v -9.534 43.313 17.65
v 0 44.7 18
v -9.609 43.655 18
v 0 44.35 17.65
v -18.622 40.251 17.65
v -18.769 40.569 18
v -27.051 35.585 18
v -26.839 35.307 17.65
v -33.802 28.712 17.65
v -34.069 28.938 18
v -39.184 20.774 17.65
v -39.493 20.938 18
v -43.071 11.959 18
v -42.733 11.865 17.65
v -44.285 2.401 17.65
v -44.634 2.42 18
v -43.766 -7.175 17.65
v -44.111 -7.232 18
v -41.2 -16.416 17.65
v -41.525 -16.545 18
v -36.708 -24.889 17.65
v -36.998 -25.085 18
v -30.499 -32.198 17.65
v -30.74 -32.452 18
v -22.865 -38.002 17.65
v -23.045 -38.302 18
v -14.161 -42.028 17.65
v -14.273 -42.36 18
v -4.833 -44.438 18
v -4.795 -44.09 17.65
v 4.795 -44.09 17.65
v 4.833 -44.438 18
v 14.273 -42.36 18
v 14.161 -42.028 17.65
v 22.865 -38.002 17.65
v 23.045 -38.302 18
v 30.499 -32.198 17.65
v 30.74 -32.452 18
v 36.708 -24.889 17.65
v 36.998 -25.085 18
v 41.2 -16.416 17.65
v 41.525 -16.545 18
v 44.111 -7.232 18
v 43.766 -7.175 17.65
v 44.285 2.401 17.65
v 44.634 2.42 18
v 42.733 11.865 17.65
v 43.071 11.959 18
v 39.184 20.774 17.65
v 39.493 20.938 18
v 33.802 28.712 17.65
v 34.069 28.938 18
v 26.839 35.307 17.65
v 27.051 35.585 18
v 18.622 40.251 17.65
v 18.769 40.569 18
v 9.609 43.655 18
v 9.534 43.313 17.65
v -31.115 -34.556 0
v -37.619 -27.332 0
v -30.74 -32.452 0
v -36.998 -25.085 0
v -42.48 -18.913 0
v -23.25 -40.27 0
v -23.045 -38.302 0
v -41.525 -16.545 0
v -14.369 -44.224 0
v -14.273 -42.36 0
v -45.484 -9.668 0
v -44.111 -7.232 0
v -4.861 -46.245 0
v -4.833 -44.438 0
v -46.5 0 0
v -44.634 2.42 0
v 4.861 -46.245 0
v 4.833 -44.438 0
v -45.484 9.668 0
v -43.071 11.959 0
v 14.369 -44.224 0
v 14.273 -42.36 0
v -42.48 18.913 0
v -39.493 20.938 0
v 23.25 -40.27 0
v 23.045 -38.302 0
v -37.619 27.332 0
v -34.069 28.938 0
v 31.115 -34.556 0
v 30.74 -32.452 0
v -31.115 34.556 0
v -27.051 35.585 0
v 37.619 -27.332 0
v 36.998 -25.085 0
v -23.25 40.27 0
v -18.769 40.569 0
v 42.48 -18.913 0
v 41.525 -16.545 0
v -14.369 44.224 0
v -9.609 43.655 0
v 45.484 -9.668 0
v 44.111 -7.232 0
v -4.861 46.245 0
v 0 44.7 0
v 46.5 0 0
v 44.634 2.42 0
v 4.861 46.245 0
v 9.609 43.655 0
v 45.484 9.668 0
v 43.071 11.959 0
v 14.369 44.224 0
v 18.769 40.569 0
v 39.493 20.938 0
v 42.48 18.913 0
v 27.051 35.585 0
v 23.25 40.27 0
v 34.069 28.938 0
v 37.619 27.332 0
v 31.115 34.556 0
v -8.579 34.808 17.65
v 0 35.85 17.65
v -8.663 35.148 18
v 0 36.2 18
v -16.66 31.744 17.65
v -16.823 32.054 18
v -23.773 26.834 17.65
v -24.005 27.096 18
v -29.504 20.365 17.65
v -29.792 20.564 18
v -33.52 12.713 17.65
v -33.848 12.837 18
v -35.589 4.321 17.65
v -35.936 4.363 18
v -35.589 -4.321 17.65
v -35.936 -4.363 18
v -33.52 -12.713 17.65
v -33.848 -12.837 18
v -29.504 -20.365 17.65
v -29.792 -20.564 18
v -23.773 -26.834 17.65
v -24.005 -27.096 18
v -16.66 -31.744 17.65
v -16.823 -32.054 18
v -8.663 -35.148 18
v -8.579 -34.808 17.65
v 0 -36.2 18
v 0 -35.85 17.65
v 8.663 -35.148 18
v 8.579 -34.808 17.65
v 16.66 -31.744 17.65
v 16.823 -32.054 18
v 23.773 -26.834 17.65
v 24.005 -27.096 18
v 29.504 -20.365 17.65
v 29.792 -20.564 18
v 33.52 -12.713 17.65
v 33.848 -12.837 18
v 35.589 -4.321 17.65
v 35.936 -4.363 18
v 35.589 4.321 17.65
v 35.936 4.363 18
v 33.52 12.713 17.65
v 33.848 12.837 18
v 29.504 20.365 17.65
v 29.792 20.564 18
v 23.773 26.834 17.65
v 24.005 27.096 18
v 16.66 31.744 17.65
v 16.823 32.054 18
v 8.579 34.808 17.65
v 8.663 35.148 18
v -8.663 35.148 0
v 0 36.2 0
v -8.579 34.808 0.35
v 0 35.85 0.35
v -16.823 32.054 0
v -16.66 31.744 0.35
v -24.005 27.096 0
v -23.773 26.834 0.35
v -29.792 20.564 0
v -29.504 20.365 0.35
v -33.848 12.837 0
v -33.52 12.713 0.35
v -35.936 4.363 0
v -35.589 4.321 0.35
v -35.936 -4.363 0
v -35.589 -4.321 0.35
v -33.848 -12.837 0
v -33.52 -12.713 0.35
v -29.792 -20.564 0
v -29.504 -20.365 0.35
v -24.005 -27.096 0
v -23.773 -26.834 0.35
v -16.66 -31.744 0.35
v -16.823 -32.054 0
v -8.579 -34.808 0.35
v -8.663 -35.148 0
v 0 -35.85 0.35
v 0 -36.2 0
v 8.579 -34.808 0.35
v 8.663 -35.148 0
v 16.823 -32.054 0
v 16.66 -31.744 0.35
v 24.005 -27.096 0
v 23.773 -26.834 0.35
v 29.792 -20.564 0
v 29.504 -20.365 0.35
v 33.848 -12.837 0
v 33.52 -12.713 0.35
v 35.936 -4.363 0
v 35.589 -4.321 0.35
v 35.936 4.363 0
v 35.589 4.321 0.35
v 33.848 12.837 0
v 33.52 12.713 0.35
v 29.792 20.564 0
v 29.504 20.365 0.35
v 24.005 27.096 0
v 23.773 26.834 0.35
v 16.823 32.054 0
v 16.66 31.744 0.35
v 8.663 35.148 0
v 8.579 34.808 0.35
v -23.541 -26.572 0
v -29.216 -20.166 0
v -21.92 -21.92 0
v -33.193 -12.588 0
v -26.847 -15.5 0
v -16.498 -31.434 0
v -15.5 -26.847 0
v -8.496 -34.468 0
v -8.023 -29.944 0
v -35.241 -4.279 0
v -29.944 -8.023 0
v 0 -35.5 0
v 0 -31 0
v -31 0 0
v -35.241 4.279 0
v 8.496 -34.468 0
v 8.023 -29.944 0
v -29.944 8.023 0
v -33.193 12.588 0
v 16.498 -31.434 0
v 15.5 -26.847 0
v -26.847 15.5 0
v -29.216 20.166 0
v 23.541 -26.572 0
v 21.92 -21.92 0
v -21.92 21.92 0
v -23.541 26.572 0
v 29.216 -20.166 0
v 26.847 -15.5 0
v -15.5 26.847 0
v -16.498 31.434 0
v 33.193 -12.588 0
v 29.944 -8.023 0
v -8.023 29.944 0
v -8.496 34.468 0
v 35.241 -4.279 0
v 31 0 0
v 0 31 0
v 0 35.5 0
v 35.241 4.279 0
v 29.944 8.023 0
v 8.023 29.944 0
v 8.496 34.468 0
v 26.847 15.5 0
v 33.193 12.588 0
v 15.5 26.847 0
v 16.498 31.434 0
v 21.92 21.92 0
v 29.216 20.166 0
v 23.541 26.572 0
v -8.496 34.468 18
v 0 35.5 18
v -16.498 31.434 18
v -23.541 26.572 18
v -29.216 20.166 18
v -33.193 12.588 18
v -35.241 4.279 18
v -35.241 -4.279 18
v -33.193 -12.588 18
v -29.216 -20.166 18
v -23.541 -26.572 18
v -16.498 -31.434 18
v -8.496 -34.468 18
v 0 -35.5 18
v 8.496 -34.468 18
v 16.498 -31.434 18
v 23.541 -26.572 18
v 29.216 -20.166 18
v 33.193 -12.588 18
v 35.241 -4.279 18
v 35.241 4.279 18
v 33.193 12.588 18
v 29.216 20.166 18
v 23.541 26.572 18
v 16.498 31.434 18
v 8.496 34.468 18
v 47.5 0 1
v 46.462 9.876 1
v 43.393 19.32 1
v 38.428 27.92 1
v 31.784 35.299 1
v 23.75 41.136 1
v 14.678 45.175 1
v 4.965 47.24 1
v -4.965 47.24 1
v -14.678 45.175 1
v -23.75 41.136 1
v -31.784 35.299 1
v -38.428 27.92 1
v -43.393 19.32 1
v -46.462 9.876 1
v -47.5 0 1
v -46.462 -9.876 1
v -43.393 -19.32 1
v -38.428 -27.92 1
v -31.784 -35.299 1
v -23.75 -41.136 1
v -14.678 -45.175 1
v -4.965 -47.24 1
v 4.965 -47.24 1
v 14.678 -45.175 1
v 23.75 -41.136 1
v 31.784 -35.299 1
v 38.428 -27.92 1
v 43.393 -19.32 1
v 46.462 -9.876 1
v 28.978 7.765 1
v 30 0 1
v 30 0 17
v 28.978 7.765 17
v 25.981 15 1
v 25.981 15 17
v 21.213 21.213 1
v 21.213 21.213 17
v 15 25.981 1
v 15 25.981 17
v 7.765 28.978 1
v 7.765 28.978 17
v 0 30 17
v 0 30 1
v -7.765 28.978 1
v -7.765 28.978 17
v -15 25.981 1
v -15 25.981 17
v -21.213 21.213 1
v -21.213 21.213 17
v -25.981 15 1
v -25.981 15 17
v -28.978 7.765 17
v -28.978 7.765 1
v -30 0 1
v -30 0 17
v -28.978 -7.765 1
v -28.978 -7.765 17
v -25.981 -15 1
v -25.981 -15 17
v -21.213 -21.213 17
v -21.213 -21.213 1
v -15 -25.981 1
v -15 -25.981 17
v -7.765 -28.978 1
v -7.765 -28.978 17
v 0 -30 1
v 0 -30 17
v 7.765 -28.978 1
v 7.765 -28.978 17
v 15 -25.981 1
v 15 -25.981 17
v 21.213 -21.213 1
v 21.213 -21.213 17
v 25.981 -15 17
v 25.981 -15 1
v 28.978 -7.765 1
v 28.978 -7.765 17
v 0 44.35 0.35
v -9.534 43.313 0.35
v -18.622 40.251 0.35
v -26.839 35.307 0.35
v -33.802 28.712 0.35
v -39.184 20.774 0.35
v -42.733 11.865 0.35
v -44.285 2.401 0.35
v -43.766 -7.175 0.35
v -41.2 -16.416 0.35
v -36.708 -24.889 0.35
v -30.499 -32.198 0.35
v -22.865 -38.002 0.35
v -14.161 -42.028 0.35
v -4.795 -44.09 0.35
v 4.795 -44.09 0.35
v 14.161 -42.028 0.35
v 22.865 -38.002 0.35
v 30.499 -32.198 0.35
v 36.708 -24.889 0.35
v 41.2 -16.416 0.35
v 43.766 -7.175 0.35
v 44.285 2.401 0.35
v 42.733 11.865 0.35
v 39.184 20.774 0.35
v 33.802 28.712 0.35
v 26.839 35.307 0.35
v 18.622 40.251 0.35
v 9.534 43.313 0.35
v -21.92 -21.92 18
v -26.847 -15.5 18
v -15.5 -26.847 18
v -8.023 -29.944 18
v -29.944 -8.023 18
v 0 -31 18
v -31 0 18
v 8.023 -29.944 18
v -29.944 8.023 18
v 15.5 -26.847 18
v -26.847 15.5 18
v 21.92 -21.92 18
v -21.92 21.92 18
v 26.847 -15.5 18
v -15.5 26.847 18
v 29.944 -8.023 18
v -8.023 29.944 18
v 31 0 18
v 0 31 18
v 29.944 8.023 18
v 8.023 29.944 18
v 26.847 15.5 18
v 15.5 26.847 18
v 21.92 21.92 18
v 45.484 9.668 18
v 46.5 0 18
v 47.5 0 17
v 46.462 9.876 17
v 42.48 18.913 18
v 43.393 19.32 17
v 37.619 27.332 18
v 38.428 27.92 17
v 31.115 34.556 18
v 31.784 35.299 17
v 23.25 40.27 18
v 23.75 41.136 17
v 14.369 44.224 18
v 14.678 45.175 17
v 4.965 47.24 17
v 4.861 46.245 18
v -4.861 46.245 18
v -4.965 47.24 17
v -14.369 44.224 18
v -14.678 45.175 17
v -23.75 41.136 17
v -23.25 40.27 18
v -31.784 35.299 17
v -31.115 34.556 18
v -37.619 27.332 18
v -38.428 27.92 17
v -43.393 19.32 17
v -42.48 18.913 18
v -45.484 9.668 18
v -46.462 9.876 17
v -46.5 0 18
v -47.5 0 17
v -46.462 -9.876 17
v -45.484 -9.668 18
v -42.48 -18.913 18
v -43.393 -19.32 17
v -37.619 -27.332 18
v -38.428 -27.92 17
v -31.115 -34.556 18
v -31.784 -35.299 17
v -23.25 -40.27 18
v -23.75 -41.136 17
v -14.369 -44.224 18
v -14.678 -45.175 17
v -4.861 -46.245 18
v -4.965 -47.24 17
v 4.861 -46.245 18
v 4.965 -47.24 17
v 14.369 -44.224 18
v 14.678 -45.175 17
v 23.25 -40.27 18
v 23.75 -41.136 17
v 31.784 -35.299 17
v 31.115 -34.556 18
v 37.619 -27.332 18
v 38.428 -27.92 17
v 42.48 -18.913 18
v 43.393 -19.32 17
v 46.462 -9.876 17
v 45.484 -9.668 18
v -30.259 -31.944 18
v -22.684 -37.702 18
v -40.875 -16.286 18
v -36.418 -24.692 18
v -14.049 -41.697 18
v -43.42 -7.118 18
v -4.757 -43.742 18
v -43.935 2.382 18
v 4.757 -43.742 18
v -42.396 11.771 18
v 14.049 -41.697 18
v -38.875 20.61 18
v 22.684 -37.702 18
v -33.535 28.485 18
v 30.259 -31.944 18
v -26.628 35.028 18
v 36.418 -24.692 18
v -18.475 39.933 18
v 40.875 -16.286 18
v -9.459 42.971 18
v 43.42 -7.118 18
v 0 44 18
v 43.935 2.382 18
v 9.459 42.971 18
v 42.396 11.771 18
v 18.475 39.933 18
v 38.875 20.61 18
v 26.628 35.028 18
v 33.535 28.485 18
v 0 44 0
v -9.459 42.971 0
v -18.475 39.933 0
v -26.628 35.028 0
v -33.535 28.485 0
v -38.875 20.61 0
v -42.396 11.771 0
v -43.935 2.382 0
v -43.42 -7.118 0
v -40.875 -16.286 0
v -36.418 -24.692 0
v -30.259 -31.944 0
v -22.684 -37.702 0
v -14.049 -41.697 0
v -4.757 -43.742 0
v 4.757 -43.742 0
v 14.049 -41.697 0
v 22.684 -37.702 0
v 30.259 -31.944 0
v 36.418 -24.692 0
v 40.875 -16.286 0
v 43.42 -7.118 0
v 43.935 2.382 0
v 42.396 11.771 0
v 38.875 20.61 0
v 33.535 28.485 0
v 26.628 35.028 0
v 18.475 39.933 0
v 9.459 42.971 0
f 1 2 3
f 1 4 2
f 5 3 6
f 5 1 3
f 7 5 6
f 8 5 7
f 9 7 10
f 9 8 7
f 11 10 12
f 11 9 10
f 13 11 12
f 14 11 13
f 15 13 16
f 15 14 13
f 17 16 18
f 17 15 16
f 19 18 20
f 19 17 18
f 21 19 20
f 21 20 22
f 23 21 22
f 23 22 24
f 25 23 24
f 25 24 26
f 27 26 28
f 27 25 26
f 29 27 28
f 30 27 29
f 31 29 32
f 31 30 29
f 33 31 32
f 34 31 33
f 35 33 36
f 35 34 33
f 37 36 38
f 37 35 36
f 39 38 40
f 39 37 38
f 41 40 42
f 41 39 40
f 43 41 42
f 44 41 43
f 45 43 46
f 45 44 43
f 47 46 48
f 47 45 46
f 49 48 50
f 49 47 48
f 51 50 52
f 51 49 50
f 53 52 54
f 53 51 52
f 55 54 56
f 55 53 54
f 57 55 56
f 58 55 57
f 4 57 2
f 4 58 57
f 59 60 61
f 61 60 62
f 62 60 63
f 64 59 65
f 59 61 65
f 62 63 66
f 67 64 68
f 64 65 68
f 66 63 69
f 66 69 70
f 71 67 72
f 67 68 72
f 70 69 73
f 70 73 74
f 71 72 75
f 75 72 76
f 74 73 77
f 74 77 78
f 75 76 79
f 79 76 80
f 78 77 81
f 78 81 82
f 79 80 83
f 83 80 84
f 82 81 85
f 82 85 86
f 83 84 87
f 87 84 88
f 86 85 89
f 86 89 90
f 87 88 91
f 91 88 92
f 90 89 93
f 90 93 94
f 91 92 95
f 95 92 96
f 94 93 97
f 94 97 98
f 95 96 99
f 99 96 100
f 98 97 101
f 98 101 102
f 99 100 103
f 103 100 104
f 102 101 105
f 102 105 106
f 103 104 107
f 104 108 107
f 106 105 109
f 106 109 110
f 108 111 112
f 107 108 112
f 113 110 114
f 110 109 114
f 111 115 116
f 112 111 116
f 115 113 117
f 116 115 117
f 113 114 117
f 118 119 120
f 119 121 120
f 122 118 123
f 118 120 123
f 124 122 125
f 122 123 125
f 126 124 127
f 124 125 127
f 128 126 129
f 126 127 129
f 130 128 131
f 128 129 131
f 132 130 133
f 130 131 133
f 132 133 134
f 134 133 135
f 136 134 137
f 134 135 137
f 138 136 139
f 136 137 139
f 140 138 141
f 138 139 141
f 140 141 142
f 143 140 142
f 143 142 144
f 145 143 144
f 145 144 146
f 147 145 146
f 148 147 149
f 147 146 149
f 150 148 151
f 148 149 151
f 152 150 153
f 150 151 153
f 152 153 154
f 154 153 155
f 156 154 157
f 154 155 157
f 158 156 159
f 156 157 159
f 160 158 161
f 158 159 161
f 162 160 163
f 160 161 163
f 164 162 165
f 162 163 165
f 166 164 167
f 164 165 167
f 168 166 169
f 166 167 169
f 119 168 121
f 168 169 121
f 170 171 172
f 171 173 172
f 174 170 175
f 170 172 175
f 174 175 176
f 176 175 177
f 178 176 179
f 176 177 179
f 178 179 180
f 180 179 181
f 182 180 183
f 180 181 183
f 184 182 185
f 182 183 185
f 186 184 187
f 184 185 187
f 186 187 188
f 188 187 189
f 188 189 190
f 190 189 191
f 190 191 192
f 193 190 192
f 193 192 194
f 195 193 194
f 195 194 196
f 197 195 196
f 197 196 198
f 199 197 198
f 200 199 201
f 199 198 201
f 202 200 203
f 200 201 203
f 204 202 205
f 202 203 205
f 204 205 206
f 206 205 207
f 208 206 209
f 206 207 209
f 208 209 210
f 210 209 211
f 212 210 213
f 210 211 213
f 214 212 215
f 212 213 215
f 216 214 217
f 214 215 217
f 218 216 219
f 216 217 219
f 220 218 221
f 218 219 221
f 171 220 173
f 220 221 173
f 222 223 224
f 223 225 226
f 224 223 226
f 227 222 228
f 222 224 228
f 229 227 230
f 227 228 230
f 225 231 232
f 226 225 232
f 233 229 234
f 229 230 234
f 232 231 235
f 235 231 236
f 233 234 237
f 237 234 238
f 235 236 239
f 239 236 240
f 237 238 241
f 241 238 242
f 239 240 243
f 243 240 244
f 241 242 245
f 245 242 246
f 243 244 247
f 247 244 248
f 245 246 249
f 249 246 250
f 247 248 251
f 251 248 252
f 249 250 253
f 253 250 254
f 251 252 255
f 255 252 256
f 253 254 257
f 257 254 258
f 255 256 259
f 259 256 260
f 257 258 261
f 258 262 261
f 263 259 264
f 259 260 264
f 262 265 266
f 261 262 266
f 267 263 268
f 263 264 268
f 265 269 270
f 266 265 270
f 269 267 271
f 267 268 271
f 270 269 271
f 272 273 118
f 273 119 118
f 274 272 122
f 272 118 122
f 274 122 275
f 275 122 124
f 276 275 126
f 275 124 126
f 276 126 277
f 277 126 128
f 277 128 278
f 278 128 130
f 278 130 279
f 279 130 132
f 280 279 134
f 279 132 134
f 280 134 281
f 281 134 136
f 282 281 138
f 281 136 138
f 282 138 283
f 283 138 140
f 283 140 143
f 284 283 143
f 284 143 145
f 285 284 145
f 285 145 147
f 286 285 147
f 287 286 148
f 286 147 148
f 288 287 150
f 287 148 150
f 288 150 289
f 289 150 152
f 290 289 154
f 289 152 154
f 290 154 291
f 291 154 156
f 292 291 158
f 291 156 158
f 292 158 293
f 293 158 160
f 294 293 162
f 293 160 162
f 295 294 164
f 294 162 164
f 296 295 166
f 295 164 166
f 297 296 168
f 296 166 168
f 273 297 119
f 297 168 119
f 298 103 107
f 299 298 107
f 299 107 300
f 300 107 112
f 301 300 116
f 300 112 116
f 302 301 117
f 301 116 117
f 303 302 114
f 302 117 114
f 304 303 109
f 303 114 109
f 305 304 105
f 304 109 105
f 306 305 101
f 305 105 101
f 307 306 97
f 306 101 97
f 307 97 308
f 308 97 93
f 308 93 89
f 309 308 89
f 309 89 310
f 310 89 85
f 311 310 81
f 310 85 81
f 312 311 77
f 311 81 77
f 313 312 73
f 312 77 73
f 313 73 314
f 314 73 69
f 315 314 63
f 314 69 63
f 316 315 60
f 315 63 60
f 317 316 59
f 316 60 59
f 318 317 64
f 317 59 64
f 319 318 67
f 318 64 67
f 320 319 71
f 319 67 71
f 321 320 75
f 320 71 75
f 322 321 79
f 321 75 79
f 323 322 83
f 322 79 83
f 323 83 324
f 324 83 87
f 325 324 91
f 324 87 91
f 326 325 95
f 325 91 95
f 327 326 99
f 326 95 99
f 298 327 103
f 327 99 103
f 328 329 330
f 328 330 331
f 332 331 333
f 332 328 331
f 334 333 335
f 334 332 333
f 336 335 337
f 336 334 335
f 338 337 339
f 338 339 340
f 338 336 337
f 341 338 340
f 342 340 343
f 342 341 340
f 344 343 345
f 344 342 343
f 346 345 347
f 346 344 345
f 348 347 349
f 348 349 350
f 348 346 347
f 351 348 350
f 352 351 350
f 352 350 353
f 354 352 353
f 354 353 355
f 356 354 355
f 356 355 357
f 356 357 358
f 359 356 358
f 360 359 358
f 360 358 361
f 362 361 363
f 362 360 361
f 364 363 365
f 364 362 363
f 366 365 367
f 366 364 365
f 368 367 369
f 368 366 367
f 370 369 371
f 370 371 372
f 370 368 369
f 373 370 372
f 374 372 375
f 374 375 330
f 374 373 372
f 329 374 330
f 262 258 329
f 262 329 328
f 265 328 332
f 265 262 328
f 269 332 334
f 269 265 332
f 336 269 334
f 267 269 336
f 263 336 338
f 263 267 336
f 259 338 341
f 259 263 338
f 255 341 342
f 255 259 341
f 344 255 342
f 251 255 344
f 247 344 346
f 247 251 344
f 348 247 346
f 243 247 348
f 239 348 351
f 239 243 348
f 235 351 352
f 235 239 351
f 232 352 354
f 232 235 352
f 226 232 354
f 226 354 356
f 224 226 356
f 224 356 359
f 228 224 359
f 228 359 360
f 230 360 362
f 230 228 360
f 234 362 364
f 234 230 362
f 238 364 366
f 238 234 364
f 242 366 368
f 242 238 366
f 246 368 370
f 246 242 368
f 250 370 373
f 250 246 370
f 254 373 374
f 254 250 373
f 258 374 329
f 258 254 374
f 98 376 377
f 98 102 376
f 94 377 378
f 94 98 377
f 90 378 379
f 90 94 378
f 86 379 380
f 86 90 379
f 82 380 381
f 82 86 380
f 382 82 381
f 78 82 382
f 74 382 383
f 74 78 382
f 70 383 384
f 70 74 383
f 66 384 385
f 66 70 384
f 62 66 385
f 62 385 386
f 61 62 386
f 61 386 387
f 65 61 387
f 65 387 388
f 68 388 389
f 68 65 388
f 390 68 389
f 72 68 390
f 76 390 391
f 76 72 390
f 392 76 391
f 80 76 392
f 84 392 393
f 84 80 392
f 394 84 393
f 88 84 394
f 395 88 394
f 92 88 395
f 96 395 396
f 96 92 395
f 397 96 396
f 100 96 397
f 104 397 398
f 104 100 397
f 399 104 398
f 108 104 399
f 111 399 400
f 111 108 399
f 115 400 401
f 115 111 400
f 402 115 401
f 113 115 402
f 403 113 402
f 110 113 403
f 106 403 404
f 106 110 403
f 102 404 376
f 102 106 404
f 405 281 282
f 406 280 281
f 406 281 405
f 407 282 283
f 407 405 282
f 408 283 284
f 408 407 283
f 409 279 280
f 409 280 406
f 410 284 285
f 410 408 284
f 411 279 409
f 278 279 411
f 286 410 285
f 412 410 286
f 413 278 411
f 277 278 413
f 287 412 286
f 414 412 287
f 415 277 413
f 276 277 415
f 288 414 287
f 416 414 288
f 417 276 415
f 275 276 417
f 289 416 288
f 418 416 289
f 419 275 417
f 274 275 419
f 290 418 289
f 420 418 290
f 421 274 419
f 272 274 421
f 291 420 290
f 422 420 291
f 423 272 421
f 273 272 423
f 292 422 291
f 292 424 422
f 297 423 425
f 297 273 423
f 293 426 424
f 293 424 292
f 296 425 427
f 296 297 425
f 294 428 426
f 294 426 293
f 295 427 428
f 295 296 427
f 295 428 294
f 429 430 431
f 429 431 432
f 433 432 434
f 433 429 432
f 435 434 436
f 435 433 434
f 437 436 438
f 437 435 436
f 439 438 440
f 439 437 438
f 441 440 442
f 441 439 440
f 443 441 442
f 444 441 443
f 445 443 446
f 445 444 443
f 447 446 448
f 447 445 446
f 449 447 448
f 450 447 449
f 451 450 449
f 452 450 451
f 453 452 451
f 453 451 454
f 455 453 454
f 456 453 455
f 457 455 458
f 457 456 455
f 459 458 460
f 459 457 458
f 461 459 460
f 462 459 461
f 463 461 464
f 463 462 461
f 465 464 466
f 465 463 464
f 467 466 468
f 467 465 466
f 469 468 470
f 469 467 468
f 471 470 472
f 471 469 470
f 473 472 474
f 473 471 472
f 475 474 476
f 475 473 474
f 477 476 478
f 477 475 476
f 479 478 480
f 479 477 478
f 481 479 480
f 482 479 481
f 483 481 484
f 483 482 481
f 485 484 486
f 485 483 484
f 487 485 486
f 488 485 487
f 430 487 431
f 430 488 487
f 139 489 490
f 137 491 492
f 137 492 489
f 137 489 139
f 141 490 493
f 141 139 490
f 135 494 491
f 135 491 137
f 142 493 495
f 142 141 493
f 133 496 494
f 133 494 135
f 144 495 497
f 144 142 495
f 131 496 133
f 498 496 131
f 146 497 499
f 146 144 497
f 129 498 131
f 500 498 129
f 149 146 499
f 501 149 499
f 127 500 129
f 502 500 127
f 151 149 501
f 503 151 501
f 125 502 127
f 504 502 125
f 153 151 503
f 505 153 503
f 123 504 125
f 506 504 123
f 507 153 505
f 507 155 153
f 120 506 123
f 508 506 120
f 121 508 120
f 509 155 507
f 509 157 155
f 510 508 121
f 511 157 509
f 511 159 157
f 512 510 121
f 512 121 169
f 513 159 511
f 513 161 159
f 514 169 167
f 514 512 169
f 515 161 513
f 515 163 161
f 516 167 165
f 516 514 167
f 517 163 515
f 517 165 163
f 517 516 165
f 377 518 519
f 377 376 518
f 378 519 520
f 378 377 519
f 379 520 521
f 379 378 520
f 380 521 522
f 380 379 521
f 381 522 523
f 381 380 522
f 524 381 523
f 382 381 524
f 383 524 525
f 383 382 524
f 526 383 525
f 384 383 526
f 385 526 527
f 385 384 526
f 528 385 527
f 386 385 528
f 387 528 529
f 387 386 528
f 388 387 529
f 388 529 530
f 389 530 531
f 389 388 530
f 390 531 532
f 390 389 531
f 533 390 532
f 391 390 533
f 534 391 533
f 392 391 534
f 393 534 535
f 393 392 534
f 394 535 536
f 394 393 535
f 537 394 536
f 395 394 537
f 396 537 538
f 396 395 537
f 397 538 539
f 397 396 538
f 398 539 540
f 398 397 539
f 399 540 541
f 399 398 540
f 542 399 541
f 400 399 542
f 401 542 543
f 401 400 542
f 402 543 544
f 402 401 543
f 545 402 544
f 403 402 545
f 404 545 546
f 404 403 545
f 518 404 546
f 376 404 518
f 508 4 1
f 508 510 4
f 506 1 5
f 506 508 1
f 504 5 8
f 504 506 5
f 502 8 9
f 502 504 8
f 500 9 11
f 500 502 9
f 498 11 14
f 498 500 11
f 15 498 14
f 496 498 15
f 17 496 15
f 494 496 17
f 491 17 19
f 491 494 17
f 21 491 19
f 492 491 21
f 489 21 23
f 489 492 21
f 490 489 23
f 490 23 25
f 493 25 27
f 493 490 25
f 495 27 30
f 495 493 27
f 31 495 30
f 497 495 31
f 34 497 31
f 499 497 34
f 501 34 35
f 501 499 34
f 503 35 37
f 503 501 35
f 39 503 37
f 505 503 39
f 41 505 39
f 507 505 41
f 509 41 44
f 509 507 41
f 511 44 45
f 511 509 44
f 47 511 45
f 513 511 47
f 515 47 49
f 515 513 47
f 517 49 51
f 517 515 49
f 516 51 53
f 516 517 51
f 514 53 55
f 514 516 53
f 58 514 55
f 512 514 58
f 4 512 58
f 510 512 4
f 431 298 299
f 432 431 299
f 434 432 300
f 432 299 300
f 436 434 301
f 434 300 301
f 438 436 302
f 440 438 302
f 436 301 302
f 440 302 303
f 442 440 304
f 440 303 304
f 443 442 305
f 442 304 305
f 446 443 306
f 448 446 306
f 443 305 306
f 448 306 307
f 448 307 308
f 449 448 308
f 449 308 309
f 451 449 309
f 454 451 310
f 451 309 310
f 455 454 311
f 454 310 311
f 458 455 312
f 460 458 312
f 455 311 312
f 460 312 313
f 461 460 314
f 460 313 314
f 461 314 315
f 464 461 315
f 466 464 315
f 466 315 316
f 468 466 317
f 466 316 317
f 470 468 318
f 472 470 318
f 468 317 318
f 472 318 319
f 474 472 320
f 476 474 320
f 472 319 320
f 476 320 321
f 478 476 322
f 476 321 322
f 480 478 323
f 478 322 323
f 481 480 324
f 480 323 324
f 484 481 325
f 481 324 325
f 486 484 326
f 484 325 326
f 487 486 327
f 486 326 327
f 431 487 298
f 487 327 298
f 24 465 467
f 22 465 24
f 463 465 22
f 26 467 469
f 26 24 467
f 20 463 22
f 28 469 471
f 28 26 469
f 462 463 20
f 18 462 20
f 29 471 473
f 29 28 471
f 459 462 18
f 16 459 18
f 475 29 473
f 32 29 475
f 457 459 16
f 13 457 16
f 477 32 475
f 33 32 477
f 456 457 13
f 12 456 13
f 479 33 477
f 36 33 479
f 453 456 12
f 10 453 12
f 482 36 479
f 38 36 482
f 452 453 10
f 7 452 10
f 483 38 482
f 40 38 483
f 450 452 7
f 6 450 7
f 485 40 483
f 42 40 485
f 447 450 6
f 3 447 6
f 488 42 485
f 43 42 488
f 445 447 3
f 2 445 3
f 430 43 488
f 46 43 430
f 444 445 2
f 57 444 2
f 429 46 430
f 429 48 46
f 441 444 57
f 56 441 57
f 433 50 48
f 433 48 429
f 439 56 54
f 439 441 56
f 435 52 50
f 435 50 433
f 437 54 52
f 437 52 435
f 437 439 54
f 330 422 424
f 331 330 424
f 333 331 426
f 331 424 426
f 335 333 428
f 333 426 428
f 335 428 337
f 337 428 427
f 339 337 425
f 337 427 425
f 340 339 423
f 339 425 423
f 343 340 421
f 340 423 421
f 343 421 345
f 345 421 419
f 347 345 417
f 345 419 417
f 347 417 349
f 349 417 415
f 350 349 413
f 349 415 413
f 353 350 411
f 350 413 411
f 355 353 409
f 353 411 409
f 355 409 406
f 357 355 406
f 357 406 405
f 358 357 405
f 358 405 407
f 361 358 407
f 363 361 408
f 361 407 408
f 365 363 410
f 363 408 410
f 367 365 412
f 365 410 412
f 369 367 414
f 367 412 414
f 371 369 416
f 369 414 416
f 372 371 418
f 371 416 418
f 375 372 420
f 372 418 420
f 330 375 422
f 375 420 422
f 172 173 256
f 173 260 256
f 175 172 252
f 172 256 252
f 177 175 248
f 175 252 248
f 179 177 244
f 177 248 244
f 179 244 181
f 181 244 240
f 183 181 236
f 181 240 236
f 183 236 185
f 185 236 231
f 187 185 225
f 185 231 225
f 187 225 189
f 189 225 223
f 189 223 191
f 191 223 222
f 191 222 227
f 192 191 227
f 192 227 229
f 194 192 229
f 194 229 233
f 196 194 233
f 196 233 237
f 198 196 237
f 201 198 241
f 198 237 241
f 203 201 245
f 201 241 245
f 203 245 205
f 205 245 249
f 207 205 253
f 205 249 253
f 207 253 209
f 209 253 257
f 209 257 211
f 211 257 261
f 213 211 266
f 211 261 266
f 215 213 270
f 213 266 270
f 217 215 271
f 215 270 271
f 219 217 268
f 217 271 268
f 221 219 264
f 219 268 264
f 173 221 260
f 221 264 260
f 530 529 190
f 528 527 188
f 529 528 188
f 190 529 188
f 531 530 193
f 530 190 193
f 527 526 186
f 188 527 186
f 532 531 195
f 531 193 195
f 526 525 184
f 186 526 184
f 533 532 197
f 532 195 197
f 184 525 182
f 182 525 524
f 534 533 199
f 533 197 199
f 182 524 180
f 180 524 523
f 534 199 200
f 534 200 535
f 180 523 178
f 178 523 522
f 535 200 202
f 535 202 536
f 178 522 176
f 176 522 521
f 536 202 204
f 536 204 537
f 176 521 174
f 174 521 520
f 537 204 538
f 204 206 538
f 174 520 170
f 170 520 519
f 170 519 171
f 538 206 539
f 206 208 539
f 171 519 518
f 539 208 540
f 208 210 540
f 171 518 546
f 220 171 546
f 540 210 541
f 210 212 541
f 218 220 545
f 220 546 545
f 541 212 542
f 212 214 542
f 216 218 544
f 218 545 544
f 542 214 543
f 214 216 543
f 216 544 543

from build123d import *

# Parameters (mm, degrees)
SKETCH1_R      = 47.5
SKETCH1_R_2    = 30
EXTRUDE1_DEPTH = 18
CHAMFER1_SIZE  = 1


with BuildPart() as part:
    # Sketch1 → Extrude1 (new body)
    with BuildSketch(Plane.XY):
        Circle(SKETCH1_R)
        Circle(SKETCH1_R_2, mode=Mode.SUBTRACT)
    extrude(amount=EXTRUDE1_DEPTH)

    # Chamfer1
    chamfer1_edges = [part.edges().sort_by_distance(p)[0] for p in [
        (-47.5, 0, 0),
        (-47.5, 0, 18),
        (-30, 0, 0),
        (-30, 0, 18),
    ]]
    chamfer(chamfer1_edges, length=CHAMFER1_SIZE)

    # Sketch2 → Cut-Revolve1 (revolve, cut)
    with BuildSketch(Plane(origin=(0, 0, 0), x_dir=(0, 0, -1), z_dir=(1, 0, 0))):
        Polygon((-18, 35.5), (-17.65, 35.85), (-18, 36.2), align=None)
        Polygon((-17.65, 44.35), (-18, 44), (-18, 44.7), align=None)
        Polygon((0, 35.5), (0, 36.2), (-0.35, 35.85), align=None)
        Polygon((0, 44.7), (0, 44), (-0.35, 44.35), align=None)
    revolve(axis=Axis((0, 0, 0), (0, 0, 1)), mode=Mode.SUBTRACT)


solid = part.part
